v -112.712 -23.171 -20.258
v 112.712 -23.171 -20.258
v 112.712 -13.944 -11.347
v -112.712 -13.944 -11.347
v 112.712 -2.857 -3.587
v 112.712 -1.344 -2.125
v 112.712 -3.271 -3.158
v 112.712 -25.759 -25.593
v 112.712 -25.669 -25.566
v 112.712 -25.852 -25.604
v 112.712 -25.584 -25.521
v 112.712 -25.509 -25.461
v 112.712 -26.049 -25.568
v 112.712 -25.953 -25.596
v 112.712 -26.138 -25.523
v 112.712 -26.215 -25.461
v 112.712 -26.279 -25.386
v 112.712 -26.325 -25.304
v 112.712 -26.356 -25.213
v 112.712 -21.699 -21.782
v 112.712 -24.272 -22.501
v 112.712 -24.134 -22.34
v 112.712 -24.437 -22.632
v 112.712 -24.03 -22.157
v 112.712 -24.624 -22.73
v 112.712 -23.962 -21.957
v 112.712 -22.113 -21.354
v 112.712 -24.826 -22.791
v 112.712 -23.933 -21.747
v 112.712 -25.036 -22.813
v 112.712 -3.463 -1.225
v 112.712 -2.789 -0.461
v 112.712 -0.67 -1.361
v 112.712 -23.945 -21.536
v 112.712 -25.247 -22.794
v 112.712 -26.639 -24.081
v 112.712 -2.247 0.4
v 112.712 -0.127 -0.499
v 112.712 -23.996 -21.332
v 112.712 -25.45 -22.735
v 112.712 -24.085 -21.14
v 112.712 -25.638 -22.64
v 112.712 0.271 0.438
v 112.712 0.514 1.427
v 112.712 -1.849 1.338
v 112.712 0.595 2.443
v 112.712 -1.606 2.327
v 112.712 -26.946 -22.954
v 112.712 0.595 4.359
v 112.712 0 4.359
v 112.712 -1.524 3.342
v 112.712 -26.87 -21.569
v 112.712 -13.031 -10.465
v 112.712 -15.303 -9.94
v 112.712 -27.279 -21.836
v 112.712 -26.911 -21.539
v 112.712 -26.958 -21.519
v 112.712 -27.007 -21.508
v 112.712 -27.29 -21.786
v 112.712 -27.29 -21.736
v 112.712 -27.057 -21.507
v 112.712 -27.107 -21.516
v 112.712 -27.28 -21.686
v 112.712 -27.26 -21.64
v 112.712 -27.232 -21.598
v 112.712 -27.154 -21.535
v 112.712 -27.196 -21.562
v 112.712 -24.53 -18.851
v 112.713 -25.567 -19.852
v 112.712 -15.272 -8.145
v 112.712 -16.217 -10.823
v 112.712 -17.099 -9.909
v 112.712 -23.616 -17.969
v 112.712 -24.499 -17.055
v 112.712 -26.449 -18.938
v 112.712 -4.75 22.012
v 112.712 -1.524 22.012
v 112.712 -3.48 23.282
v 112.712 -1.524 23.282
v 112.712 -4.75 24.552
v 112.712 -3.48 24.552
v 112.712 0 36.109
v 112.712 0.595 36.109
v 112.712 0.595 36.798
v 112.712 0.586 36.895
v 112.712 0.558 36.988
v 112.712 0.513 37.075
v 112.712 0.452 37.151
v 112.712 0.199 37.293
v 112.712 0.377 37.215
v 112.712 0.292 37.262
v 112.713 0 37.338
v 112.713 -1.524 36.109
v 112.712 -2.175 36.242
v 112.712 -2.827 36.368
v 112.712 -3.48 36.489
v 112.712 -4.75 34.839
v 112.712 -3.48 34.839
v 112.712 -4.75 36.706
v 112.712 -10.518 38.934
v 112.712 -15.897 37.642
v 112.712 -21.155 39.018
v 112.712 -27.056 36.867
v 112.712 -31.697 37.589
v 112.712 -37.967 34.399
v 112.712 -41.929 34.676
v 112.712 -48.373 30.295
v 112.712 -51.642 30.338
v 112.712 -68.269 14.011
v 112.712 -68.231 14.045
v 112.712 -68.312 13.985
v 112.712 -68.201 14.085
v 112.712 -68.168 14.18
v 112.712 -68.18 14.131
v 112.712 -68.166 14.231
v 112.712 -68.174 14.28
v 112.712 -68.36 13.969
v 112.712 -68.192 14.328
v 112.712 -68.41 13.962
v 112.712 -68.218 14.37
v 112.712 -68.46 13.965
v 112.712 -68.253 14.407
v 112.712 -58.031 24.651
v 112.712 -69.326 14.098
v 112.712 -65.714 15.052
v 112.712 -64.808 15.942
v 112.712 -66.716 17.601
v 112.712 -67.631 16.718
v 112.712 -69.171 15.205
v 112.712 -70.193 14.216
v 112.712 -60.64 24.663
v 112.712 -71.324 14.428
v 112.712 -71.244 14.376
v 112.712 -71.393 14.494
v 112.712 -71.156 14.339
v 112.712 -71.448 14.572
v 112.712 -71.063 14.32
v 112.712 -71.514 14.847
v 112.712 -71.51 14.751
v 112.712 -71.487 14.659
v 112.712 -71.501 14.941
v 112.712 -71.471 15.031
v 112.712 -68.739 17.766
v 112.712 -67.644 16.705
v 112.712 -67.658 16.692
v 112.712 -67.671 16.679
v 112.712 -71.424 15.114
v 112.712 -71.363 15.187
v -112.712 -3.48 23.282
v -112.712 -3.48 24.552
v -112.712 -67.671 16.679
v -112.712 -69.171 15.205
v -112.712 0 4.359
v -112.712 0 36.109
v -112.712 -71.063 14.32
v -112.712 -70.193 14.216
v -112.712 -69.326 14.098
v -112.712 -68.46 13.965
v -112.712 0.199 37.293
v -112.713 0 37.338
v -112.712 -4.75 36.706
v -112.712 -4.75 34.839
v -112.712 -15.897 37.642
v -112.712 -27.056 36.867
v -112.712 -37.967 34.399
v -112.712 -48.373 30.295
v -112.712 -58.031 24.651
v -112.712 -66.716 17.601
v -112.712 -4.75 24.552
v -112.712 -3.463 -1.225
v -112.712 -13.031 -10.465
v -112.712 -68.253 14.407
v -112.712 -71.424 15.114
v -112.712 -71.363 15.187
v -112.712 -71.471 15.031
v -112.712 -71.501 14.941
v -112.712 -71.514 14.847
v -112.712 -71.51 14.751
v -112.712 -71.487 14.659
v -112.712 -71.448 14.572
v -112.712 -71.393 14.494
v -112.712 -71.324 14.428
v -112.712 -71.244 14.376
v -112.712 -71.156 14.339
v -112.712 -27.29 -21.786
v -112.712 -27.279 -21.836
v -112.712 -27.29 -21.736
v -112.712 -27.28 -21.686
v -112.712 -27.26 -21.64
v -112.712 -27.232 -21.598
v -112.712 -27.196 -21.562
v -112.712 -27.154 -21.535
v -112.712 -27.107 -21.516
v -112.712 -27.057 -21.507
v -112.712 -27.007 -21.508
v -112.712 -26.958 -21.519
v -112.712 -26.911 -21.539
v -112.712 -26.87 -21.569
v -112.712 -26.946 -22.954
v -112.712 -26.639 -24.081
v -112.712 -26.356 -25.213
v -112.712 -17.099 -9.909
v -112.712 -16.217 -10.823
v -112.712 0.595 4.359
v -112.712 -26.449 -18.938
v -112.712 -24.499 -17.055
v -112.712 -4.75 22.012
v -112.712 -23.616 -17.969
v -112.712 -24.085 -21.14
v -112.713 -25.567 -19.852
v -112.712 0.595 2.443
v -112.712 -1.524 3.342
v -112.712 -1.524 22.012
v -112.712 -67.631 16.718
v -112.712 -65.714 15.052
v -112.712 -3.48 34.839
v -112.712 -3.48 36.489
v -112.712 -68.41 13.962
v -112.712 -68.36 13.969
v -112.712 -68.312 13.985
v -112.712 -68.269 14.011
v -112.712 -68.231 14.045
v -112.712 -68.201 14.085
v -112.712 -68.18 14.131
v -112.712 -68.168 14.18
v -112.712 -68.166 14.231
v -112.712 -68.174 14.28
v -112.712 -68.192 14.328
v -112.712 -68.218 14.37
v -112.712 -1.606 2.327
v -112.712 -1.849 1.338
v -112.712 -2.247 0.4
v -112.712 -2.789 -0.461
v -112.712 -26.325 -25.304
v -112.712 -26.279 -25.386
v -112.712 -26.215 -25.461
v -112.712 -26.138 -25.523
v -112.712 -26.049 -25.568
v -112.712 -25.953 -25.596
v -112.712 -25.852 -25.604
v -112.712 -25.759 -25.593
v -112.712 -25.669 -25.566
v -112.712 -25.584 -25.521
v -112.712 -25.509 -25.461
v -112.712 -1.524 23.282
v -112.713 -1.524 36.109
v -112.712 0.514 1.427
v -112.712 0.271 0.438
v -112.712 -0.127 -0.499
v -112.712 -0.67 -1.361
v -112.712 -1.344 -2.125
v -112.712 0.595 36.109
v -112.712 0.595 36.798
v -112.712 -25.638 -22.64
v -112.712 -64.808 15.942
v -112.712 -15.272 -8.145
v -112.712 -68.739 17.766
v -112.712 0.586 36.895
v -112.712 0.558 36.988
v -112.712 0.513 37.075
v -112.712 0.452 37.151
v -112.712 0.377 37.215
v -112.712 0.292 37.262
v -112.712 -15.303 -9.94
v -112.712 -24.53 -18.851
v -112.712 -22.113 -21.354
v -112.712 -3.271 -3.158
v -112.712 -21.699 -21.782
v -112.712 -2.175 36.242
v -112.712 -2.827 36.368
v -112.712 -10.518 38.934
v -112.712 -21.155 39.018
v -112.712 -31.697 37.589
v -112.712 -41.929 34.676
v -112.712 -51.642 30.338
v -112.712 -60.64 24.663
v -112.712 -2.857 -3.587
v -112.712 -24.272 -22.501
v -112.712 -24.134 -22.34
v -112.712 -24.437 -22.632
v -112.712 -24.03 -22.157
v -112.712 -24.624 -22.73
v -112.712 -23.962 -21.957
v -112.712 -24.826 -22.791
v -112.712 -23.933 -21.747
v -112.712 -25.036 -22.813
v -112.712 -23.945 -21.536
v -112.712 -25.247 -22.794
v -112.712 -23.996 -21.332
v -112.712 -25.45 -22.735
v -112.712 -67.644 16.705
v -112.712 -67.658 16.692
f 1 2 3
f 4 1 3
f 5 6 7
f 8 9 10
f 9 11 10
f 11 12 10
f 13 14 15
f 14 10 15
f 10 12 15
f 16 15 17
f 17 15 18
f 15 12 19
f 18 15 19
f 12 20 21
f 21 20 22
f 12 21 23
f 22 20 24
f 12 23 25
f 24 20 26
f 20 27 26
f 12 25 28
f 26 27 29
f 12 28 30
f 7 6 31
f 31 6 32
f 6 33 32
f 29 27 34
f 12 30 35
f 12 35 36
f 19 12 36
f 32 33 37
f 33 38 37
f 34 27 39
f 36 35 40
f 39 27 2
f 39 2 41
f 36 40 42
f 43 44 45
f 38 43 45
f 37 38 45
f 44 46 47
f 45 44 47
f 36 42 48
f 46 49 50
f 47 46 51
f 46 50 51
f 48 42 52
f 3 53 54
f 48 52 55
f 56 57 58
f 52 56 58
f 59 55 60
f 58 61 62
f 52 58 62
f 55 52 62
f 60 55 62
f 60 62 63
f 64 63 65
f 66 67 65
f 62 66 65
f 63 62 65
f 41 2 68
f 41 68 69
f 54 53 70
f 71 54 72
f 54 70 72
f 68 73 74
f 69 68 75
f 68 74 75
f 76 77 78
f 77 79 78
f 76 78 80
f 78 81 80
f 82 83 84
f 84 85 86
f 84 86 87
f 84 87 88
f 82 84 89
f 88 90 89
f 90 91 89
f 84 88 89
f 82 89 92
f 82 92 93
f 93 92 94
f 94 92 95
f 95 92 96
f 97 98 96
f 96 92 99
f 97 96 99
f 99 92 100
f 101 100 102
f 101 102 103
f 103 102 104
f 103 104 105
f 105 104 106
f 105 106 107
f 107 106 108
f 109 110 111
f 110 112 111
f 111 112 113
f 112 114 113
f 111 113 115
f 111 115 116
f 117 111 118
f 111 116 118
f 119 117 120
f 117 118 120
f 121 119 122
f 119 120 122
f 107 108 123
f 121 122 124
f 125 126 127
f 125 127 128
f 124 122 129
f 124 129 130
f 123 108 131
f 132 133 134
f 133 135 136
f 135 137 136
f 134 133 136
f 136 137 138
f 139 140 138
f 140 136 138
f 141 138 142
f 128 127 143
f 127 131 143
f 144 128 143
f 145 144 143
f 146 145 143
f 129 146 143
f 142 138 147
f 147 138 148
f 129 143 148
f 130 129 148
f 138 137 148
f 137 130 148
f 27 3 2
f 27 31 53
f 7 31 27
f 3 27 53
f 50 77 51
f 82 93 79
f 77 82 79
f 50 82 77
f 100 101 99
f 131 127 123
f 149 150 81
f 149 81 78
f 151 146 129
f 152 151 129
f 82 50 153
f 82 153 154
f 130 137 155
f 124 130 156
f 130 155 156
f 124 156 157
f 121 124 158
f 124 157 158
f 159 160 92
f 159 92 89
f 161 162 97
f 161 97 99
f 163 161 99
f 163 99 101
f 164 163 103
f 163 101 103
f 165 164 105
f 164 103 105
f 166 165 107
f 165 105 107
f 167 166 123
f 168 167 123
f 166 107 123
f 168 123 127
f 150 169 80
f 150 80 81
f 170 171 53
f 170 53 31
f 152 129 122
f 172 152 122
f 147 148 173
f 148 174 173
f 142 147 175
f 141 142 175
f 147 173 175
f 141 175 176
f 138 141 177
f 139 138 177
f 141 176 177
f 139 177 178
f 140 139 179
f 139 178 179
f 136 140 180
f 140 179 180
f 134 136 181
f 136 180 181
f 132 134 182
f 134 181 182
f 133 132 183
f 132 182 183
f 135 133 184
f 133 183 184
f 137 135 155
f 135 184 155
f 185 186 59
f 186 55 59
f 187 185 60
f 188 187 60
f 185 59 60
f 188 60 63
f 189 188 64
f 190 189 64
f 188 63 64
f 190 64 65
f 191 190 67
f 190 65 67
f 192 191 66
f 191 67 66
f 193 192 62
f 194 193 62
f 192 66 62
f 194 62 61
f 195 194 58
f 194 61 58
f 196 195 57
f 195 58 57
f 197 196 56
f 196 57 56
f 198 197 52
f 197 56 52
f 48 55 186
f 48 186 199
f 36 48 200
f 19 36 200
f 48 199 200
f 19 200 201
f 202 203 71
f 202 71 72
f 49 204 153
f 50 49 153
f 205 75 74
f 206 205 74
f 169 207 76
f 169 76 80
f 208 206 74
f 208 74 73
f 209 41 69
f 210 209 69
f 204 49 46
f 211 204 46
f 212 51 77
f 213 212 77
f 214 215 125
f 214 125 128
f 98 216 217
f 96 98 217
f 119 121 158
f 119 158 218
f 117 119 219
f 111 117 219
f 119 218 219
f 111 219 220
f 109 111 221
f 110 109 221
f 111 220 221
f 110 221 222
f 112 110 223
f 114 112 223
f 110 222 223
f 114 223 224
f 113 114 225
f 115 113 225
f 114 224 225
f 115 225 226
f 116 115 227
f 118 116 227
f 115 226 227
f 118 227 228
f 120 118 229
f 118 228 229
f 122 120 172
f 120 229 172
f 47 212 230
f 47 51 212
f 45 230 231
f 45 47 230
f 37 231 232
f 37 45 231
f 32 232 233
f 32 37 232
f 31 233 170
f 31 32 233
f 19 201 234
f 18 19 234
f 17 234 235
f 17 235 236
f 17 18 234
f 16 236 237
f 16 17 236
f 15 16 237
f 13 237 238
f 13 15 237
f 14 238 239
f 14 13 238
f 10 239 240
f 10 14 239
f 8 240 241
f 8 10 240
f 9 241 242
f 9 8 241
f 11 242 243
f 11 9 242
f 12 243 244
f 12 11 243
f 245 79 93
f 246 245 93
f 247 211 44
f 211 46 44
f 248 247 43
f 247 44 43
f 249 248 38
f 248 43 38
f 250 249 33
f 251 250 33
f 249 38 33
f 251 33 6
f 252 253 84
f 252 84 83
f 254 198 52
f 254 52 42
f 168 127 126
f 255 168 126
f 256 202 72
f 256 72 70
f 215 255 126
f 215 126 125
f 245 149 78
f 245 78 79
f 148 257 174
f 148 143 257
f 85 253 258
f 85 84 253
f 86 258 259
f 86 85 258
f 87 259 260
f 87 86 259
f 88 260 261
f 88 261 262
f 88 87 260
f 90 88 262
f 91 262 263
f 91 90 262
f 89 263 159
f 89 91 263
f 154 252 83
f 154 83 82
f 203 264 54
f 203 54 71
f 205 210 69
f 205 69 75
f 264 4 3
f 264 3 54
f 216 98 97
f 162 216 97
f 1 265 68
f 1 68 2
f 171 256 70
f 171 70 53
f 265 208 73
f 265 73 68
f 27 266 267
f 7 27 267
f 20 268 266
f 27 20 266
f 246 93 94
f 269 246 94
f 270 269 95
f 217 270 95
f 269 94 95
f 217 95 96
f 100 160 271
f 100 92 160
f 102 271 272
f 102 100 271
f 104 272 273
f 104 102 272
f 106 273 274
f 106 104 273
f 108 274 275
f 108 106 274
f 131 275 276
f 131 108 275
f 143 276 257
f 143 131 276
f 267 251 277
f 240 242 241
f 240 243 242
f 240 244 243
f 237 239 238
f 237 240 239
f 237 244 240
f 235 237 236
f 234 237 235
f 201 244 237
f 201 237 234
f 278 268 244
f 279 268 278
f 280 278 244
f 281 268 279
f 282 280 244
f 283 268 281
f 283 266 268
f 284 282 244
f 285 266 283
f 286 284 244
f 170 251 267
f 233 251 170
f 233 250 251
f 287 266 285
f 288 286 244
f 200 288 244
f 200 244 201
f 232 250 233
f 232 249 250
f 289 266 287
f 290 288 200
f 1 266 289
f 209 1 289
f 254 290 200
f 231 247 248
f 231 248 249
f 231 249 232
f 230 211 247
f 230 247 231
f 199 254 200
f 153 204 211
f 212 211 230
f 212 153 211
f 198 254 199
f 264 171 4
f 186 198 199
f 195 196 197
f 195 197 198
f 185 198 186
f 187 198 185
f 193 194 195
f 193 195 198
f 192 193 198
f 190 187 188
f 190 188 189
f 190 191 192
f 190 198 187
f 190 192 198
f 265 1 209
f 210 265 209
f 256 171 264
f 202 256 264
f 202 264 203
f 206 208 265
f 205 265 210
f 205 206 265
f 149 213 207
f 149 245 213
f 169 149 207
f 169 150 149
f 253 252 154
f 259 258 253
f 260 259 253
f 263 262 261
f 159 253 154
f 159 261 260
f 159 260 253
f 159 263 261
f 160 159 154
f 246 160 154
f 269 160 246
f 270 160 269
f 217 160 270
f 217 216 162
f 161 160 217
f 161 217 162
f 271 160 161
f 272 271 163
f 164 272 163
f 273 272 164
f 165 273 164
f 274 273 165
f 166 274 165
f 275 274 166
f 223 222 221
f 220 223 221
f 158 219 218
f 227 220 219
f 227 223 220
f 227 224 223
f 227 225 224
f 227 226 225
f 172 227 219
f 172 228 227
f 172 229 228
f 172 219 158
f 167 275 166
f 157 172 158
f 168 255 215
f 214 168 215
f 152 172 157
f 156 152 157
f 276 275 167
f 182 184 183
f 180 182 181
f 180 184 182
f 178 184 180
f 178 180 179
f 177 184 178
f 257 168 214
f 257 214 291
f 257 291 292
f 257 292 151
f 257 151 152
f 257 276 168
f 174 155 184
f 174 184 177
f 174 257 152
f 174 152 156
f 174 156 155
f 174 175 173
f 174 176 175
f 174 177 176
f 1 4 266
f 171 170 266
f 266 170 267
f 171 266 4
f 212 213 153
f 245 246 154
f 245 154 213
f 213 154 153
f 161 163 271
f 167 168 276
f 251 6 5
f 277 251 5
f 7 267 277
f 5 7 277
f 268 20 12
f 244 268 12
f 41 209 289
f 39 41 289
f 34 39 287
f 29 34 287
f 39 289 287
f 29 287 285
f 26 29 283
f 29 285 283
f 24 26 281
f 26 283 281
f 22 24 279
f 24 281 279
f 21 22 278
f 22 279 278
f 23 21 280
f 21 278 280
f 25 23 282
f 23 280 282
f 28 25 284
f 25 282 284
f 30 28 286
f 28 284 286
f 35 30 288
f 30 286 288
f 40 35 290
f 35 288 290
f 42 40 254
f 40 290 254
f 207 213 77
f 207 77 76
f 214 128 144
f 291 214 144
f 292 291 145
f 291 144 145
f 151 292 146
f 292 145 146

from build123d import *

# Parameters (mm, degrees)
F1_DEPTH  = 112.7125
F2_T      = -1.524
F5_DEPTH  = 225.425
F7_DEPTH  = 225.425
F8_R      = 51.8099901909
F9_DEPTH  = 225.425
F14_W     = 1.27
F14_H     = 1.8664713708
F15_DEPTH = 225.425
F17_DEPTH = 225.425
F18_W     = 0.5953125
F18_H     = 31.75
F19_DEPTH = 225.425
F21_DEPTH = 225.425
F23_DEPTH = 225.425
F24_R     = 0.508
F25_R     = 6.35
F26_R     = 0.254


with BuildPart() as f1:
    # F0 (on Right) → F1 (new body, symmetric)
    with BuildSketch(Plane.YZ):
        with BuildLine():
            Line((-72.136, 14.4276117903), (-26.3105725372, -25.4078245579))
            Line((-26.3105725372, -25.4078245579), (0, 0))
            Line((0, 0), (0, 37.338))
            ThreePointArc((0, 37.338), (-36.8647965725, 36.3151722047), (-68.7392263709, 17.7657752319))
            Line((-68.7392263709, 17.7657752319), (-72.136, 14.4276117903))
        make_face()
    extrude(amount=F1_DEPTH, both=True)

    # F2
    f2_openings = [f1.faces().sort_by_distance(p)[0] for p in [
        (0, -49.223286, -5.490106),
        (-112.7125, -29.609995, 11.681685),
        (112.7125, -29.609995, 11.681685),
    ]]
    offset(amount=F2_T, openings=f2_openings)

    # F4 (on face) → F5 (join, through all)
    with BuildSketch(Plane(origin=(-112.7125, 0, 0), x_dir=(0, -1, 0), z_dir=(-1, 0, 0))):
        Polygon((69.0653059094, 11.7582981414), (70.9822682431, 13.424688075), (69.170655641, 15.2050419106), (67.2536933072, 13.5386519769), align=None)
    extrude(amount=-F5_DEPTH)

    # F6 (on face) → F7 (join, through all)
    with BuildSketch(Plane(origin=(-112.7125, 0, 0), x_dir=(0, -1, 0), z_dir=(-1, 0, 0))):
        Polygon((27.5549826692, -20.9733491998), (25.6380203354, -22.6397391335), (27.4651434283, -24.4041713944), (29.382105762, -22.7377814608), align=None)
    extrude(amount=-F7_DEPTH)

    # F8 (on face) → F9 (cut, through all)
    with BuildSketch(Plane(origin=(-112.7125, 0, 0), x_dir=(0, -1, 0), z_dir=(-1, 0, 0))):
        with Locations((76.7665722185, -37.1750323717)):
            Circle(F8_R)
    extrude(amount=-F9_DEPTH, mode=Mode.SUBTRACT)

    # F10 (on face) + F11 (on face) + F12 (on face) + F13 (on face) + F14 (on face) → F15 (join, through all)
    with BuildSketch(Plane(origin=(-112.7125, 0, 0), x_dir=(0, -1, 0), z_dir=(-1, 0, 0))):
        Polygon((23.17140416, -20.2577555812), (24.0849657065, -21.1399717116), (25.5666650167, -19.8519501518), (24.530017001, -18.8508707997), align=None)
    with BuildSketch(Plane(origin=(-112.7125, 0, 0), x_dir=(0, -1, 0), z_dir=(-1, 0, 0))):
        Polygon((23.6164554546, -17.9686546692), (25.5666650167, -19.8519501518), (26.4488811472, -18.9383886054), (24.498671585, -17.0550931227), align=None)
    with BuildSketch(Plane(origin=(-112.7125, 0, 0), x_dir=(0, -1, 0), z_dir=(-1, 0, 0))):
        Polygon((65.7138225954, 15.0519527371), (67.6307849291, 16.7183426707), (66.724978628, 17.6085195885), (64.8080162943, 15.9421296549), align=None)
    with BuildSketch(Plane(origin=(-112.7125, 0, 0), x_dir=(0, -1, 0), z_dir=(-1, 0, 0))):
        Polygon((13.0308709947, -10.4651565328), (13.9444325411, -11.3473726633), (15.303045382, -9.9404878818), (16.2166069285, -10.8227040123), (17.098823059, -9.9091424658), (15.2716999661, -8.1447102049), align=None)
    with BuildSketch(Plane(origin=(-112.7125, 0, 0), x_dir=(0, -1, 0), z_dir=(-1, 0, 0))):
        Polygon((1.524, 23.2821790422), (1.524, 22.0121790422), (4.7498, 22.0121790422), (4.7498, 24.5521790422), (3.4798, 24.5521790422), (3.4798, 23.2821790422), align=None)
        with Locations((4.1148, 35.7724147276)):
            Rectangle(F14_W, F14_H)
    extrude(amount=-F15_DEPTH)

    # F16 (on face) → F17 (join, through all)
    with BuildSketch(Plane(origin=(-112.7125, 0, 0), x_dir=(0, -1, 0), z_dir=(-1, 0, 0))):
        Polygon((-0.5953125, 37.2036794522), (-0.5953125, -0.252695164), (26.1530440412, -26.0832828204), (26.3105725372, -25.4078245579), (0, 0), (0, 37.338), align=None)
    extrude(amount=-F17_DEPTH)

    # F18 (on face) → F19 (cut, through all)
    with BuildSketch(Plane(origin=(-112.7125, 0, 0), x_dir=(0, -1, 0), z_dir=(-1, 0, 0))):
        with Locations((-0.29765625, 20.2341790422)):
            Rectangle(F18_W, F18_H)
    extrude(amount=-F19_DEPTH, mode=Mode.SUBTRACT)

    # F20 (on face) → F21 (cut, through all)
    with BuildSketch(Plane(origin=(-112.7125, 0, 0), x_dir=(0, -1, 0), z_dir=(-1, 0, 0))):
        Polygon((3.2705379083, -3.1583217457), (2.8569990972, -3.5865537206), (21.6992059923, -21.7822614118), (22.1127448035, -21.3540294369), align=None)
    extrude(amount=-F21_DEPTH, mode=Mode.SUBTRACT)

    # F22 (on face) → F23 (cut, through all)
    with BuildSketch(Plane(origin=(-112.7125, 0, 0), x_dir=(0, -1, 0), z_dir=(-1, 0, 0))):
        with BuildLine():
            Line((25.6380203354, -22.6397391335), (24.0849657065, -21.1399717116))
            ThreePointArc((24.0849657065, -21.1399717116), (24.2715109837, -22.5007997067), (25.6380203354, -22.6397391335))
        make_face()
    extrude(amount=-F23_DEPTH, mode=Mode.SUBTRACT)

    # F24
    f24_edges = [f1.edges().sort_by_distance(p)[0] for p in [
        (0, -72.136, 14.427612),
        (0, 0.595312, 37.203679),
        (0, -26.153044, -26.083283),
    ]]
    fillet(f24_edges, radius=F24_R)

    # F25
    f25_edges = [f1.edges().sort_by_distance(p)[0] for p in [
        (0, -1.524, 0.6469),
        (0, 0.595313, -0.252695),
    ]]
    fillet(f25_edges, radius=F25_R)

    # F26
    f26_edges = [f1.edges().sort_by_distance(p)[0] for p in [
        (0, -27.554983, -20.973349),
        (0, -67.567953, 13.811833),
    ]]
    fillet(f26_edges, radius=F26_R)


solid = f1.part
